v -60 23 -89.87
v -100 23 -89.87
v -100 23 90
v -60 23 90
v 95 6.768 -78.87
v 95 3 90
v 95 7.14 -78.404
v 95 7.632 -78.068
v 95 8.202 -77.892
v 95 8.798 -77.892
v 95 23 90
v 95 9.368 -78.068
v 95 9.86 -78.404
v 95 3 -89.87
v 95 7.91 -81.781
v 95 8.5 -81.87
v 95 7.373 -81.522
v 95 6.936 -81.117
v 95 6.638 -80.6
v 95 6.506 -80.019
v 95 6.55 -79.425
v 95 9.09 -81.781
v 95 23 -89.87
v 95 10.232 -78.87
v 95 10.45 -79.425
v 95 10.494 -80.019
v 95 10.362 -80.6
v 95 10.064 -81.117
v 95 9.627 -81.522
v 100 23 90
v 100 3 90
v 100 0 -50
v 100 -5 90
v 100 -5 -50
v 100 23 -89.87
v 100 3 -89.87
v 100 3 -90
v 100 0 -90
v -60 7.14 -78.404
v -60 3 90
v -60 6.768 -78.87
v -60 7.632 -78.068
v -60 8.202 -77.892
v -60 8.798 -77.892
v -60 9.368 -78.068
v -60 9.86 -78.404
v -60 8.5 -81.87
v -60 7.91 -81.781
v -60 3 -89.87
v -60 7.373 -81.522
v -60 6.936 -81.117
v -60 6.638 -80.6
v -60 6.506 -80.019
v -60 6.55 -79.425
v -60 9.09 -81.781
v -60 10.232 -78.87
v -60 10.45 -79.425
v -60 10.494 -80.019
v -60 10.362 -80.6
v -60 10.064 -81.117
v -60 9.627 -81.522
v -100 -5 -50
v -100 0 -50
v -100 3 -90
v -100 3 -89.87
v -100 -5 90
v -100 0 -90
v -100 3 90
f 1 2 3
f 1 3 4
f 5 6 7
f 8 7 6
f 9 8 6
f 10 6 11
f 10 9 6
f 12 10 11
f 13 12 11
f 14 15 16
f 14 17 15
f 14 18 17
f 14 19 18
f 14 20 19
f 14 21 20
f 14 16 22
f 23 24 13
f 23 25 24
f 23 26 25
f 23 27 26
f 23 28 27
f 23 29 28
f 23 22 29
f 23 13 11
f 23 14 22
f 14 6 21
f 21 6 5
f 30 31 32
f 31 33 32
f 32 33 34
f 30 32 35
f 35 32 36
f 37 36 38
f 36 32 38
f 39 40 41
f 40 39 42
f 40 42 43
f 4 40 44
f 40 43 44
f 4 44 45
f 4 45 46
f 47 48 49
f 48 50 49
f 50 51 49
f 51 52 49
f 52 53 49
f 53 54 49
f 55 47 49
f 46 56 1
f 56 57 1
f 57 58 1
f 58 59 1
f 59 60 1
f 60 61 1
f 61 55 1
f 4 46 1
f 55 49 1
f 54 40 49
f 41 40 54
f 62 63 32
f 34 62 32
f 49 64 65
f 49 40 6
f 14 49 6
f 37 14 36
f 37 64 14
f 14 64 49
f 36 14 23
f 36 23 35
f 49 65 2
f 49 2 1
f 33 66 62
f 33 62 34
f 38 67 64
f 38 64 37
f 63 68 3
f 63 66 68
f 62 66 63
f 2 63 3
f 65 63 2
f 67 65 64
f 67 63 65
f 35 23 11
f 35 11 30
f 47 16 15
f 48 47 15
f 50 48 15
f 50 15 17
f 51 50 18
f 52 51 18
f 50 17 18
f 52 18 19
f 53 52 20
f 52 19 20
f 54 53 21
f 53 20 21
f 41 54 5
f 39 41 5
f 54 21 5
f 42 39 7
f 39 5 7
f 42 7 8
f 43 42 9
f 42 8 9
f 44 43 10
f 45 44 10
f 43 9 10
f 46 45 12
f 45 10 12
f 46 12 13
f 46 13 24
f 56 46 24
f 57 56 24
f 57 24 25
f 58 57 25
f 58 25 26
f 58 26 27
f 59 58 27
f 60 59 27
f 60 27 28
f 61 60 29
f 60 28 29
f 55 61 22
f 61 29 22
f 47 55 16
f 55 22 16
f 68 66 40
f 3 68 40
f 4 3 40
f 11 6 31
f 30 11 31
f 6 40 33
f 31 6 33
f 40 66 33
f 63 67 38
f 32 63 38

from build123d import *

# Parameters (mm, degrees)
SKETCH1_W           = 200
SKETCH1_H           = 180
BOSS_EXTRUDE1_DEPTH = 3
SKETCH2_W           = 200
SKETCH2_H           = 140
BOSS_EXTRUDE2_DEPTH = 5
SKETCH6_W           = 200
SKETCH6_H           = 179.869705491
BOSS_EXTRUDE3_DEPTH = 20
SKETCH7_W           = 155
SKETCH7_H           = 20
CUT_EXTRUDE1_DEPTH  = 179.869705491
SKETCH8_R           = 2
BOSS_EXTRUDE4_DEPTH = 155


with BuildPart() as part:
    # Sketch1 → Boss-Extrude1 (new body)
    with BuildSketch(Plane(origin=(0, 0, 0), x_dir=(1, 0, 0), z_dir=(0, 1, 0))):
        Rectangle(SKETCH1_W, SKETCH1_H)
    extrude(amount=BOSS_EXTRUDE1_DEPTH)

    # Sketch2 → Boss-Extrude2 (add)
    with BuildSketch(Plane.XZ):
        with Locations((0, 20)):
            Rectangle(SKETCH2_W, SKETCH2_H)
    extrude(amount=BOSS_EXTRUDE2_DEPTH)

    # Sketch6 → Boss-Extrude3 (add)
    with BuildSketch(Plane(origin=(0, 3, 0), x_dir=(1, 0, 0), z_dir=(0, 1, 0))):
        with Locations((0, -0.065147254)):
            Rectangle(SKETCH6_W, SKETCH6_H)
    extrude(amount=BOSS_EXTRUDE3_DEPTH)

    # Sketch7 → Cut-Extrude1 (cut)
    with BuildSketch(Plane(origin=(0, 0, -89.869705491), x_dir=(-1, 0, 0), z_dir=(0, 0, -1))):
        with Locations((-17.5, 13)):
            Rectangle(SKETCH7_W, SKETCH7_H)
    extrude(amount=-CUT_EXTRUDE1_DEPTH, mode=Mode.SUBTRACT)

    # Sketch8 → Boss-Extrude4 (add)
    with BuildSketch(Plane.ZY.offset(-95)):
        with Locations(Location((-79.869705491, 8.5, 0), (0, 0, 180))):
            Circle(SKETCH8_R)
    extrude(amount=BOSS_EXTRUDE4_DEPTH)


solid = part.part
